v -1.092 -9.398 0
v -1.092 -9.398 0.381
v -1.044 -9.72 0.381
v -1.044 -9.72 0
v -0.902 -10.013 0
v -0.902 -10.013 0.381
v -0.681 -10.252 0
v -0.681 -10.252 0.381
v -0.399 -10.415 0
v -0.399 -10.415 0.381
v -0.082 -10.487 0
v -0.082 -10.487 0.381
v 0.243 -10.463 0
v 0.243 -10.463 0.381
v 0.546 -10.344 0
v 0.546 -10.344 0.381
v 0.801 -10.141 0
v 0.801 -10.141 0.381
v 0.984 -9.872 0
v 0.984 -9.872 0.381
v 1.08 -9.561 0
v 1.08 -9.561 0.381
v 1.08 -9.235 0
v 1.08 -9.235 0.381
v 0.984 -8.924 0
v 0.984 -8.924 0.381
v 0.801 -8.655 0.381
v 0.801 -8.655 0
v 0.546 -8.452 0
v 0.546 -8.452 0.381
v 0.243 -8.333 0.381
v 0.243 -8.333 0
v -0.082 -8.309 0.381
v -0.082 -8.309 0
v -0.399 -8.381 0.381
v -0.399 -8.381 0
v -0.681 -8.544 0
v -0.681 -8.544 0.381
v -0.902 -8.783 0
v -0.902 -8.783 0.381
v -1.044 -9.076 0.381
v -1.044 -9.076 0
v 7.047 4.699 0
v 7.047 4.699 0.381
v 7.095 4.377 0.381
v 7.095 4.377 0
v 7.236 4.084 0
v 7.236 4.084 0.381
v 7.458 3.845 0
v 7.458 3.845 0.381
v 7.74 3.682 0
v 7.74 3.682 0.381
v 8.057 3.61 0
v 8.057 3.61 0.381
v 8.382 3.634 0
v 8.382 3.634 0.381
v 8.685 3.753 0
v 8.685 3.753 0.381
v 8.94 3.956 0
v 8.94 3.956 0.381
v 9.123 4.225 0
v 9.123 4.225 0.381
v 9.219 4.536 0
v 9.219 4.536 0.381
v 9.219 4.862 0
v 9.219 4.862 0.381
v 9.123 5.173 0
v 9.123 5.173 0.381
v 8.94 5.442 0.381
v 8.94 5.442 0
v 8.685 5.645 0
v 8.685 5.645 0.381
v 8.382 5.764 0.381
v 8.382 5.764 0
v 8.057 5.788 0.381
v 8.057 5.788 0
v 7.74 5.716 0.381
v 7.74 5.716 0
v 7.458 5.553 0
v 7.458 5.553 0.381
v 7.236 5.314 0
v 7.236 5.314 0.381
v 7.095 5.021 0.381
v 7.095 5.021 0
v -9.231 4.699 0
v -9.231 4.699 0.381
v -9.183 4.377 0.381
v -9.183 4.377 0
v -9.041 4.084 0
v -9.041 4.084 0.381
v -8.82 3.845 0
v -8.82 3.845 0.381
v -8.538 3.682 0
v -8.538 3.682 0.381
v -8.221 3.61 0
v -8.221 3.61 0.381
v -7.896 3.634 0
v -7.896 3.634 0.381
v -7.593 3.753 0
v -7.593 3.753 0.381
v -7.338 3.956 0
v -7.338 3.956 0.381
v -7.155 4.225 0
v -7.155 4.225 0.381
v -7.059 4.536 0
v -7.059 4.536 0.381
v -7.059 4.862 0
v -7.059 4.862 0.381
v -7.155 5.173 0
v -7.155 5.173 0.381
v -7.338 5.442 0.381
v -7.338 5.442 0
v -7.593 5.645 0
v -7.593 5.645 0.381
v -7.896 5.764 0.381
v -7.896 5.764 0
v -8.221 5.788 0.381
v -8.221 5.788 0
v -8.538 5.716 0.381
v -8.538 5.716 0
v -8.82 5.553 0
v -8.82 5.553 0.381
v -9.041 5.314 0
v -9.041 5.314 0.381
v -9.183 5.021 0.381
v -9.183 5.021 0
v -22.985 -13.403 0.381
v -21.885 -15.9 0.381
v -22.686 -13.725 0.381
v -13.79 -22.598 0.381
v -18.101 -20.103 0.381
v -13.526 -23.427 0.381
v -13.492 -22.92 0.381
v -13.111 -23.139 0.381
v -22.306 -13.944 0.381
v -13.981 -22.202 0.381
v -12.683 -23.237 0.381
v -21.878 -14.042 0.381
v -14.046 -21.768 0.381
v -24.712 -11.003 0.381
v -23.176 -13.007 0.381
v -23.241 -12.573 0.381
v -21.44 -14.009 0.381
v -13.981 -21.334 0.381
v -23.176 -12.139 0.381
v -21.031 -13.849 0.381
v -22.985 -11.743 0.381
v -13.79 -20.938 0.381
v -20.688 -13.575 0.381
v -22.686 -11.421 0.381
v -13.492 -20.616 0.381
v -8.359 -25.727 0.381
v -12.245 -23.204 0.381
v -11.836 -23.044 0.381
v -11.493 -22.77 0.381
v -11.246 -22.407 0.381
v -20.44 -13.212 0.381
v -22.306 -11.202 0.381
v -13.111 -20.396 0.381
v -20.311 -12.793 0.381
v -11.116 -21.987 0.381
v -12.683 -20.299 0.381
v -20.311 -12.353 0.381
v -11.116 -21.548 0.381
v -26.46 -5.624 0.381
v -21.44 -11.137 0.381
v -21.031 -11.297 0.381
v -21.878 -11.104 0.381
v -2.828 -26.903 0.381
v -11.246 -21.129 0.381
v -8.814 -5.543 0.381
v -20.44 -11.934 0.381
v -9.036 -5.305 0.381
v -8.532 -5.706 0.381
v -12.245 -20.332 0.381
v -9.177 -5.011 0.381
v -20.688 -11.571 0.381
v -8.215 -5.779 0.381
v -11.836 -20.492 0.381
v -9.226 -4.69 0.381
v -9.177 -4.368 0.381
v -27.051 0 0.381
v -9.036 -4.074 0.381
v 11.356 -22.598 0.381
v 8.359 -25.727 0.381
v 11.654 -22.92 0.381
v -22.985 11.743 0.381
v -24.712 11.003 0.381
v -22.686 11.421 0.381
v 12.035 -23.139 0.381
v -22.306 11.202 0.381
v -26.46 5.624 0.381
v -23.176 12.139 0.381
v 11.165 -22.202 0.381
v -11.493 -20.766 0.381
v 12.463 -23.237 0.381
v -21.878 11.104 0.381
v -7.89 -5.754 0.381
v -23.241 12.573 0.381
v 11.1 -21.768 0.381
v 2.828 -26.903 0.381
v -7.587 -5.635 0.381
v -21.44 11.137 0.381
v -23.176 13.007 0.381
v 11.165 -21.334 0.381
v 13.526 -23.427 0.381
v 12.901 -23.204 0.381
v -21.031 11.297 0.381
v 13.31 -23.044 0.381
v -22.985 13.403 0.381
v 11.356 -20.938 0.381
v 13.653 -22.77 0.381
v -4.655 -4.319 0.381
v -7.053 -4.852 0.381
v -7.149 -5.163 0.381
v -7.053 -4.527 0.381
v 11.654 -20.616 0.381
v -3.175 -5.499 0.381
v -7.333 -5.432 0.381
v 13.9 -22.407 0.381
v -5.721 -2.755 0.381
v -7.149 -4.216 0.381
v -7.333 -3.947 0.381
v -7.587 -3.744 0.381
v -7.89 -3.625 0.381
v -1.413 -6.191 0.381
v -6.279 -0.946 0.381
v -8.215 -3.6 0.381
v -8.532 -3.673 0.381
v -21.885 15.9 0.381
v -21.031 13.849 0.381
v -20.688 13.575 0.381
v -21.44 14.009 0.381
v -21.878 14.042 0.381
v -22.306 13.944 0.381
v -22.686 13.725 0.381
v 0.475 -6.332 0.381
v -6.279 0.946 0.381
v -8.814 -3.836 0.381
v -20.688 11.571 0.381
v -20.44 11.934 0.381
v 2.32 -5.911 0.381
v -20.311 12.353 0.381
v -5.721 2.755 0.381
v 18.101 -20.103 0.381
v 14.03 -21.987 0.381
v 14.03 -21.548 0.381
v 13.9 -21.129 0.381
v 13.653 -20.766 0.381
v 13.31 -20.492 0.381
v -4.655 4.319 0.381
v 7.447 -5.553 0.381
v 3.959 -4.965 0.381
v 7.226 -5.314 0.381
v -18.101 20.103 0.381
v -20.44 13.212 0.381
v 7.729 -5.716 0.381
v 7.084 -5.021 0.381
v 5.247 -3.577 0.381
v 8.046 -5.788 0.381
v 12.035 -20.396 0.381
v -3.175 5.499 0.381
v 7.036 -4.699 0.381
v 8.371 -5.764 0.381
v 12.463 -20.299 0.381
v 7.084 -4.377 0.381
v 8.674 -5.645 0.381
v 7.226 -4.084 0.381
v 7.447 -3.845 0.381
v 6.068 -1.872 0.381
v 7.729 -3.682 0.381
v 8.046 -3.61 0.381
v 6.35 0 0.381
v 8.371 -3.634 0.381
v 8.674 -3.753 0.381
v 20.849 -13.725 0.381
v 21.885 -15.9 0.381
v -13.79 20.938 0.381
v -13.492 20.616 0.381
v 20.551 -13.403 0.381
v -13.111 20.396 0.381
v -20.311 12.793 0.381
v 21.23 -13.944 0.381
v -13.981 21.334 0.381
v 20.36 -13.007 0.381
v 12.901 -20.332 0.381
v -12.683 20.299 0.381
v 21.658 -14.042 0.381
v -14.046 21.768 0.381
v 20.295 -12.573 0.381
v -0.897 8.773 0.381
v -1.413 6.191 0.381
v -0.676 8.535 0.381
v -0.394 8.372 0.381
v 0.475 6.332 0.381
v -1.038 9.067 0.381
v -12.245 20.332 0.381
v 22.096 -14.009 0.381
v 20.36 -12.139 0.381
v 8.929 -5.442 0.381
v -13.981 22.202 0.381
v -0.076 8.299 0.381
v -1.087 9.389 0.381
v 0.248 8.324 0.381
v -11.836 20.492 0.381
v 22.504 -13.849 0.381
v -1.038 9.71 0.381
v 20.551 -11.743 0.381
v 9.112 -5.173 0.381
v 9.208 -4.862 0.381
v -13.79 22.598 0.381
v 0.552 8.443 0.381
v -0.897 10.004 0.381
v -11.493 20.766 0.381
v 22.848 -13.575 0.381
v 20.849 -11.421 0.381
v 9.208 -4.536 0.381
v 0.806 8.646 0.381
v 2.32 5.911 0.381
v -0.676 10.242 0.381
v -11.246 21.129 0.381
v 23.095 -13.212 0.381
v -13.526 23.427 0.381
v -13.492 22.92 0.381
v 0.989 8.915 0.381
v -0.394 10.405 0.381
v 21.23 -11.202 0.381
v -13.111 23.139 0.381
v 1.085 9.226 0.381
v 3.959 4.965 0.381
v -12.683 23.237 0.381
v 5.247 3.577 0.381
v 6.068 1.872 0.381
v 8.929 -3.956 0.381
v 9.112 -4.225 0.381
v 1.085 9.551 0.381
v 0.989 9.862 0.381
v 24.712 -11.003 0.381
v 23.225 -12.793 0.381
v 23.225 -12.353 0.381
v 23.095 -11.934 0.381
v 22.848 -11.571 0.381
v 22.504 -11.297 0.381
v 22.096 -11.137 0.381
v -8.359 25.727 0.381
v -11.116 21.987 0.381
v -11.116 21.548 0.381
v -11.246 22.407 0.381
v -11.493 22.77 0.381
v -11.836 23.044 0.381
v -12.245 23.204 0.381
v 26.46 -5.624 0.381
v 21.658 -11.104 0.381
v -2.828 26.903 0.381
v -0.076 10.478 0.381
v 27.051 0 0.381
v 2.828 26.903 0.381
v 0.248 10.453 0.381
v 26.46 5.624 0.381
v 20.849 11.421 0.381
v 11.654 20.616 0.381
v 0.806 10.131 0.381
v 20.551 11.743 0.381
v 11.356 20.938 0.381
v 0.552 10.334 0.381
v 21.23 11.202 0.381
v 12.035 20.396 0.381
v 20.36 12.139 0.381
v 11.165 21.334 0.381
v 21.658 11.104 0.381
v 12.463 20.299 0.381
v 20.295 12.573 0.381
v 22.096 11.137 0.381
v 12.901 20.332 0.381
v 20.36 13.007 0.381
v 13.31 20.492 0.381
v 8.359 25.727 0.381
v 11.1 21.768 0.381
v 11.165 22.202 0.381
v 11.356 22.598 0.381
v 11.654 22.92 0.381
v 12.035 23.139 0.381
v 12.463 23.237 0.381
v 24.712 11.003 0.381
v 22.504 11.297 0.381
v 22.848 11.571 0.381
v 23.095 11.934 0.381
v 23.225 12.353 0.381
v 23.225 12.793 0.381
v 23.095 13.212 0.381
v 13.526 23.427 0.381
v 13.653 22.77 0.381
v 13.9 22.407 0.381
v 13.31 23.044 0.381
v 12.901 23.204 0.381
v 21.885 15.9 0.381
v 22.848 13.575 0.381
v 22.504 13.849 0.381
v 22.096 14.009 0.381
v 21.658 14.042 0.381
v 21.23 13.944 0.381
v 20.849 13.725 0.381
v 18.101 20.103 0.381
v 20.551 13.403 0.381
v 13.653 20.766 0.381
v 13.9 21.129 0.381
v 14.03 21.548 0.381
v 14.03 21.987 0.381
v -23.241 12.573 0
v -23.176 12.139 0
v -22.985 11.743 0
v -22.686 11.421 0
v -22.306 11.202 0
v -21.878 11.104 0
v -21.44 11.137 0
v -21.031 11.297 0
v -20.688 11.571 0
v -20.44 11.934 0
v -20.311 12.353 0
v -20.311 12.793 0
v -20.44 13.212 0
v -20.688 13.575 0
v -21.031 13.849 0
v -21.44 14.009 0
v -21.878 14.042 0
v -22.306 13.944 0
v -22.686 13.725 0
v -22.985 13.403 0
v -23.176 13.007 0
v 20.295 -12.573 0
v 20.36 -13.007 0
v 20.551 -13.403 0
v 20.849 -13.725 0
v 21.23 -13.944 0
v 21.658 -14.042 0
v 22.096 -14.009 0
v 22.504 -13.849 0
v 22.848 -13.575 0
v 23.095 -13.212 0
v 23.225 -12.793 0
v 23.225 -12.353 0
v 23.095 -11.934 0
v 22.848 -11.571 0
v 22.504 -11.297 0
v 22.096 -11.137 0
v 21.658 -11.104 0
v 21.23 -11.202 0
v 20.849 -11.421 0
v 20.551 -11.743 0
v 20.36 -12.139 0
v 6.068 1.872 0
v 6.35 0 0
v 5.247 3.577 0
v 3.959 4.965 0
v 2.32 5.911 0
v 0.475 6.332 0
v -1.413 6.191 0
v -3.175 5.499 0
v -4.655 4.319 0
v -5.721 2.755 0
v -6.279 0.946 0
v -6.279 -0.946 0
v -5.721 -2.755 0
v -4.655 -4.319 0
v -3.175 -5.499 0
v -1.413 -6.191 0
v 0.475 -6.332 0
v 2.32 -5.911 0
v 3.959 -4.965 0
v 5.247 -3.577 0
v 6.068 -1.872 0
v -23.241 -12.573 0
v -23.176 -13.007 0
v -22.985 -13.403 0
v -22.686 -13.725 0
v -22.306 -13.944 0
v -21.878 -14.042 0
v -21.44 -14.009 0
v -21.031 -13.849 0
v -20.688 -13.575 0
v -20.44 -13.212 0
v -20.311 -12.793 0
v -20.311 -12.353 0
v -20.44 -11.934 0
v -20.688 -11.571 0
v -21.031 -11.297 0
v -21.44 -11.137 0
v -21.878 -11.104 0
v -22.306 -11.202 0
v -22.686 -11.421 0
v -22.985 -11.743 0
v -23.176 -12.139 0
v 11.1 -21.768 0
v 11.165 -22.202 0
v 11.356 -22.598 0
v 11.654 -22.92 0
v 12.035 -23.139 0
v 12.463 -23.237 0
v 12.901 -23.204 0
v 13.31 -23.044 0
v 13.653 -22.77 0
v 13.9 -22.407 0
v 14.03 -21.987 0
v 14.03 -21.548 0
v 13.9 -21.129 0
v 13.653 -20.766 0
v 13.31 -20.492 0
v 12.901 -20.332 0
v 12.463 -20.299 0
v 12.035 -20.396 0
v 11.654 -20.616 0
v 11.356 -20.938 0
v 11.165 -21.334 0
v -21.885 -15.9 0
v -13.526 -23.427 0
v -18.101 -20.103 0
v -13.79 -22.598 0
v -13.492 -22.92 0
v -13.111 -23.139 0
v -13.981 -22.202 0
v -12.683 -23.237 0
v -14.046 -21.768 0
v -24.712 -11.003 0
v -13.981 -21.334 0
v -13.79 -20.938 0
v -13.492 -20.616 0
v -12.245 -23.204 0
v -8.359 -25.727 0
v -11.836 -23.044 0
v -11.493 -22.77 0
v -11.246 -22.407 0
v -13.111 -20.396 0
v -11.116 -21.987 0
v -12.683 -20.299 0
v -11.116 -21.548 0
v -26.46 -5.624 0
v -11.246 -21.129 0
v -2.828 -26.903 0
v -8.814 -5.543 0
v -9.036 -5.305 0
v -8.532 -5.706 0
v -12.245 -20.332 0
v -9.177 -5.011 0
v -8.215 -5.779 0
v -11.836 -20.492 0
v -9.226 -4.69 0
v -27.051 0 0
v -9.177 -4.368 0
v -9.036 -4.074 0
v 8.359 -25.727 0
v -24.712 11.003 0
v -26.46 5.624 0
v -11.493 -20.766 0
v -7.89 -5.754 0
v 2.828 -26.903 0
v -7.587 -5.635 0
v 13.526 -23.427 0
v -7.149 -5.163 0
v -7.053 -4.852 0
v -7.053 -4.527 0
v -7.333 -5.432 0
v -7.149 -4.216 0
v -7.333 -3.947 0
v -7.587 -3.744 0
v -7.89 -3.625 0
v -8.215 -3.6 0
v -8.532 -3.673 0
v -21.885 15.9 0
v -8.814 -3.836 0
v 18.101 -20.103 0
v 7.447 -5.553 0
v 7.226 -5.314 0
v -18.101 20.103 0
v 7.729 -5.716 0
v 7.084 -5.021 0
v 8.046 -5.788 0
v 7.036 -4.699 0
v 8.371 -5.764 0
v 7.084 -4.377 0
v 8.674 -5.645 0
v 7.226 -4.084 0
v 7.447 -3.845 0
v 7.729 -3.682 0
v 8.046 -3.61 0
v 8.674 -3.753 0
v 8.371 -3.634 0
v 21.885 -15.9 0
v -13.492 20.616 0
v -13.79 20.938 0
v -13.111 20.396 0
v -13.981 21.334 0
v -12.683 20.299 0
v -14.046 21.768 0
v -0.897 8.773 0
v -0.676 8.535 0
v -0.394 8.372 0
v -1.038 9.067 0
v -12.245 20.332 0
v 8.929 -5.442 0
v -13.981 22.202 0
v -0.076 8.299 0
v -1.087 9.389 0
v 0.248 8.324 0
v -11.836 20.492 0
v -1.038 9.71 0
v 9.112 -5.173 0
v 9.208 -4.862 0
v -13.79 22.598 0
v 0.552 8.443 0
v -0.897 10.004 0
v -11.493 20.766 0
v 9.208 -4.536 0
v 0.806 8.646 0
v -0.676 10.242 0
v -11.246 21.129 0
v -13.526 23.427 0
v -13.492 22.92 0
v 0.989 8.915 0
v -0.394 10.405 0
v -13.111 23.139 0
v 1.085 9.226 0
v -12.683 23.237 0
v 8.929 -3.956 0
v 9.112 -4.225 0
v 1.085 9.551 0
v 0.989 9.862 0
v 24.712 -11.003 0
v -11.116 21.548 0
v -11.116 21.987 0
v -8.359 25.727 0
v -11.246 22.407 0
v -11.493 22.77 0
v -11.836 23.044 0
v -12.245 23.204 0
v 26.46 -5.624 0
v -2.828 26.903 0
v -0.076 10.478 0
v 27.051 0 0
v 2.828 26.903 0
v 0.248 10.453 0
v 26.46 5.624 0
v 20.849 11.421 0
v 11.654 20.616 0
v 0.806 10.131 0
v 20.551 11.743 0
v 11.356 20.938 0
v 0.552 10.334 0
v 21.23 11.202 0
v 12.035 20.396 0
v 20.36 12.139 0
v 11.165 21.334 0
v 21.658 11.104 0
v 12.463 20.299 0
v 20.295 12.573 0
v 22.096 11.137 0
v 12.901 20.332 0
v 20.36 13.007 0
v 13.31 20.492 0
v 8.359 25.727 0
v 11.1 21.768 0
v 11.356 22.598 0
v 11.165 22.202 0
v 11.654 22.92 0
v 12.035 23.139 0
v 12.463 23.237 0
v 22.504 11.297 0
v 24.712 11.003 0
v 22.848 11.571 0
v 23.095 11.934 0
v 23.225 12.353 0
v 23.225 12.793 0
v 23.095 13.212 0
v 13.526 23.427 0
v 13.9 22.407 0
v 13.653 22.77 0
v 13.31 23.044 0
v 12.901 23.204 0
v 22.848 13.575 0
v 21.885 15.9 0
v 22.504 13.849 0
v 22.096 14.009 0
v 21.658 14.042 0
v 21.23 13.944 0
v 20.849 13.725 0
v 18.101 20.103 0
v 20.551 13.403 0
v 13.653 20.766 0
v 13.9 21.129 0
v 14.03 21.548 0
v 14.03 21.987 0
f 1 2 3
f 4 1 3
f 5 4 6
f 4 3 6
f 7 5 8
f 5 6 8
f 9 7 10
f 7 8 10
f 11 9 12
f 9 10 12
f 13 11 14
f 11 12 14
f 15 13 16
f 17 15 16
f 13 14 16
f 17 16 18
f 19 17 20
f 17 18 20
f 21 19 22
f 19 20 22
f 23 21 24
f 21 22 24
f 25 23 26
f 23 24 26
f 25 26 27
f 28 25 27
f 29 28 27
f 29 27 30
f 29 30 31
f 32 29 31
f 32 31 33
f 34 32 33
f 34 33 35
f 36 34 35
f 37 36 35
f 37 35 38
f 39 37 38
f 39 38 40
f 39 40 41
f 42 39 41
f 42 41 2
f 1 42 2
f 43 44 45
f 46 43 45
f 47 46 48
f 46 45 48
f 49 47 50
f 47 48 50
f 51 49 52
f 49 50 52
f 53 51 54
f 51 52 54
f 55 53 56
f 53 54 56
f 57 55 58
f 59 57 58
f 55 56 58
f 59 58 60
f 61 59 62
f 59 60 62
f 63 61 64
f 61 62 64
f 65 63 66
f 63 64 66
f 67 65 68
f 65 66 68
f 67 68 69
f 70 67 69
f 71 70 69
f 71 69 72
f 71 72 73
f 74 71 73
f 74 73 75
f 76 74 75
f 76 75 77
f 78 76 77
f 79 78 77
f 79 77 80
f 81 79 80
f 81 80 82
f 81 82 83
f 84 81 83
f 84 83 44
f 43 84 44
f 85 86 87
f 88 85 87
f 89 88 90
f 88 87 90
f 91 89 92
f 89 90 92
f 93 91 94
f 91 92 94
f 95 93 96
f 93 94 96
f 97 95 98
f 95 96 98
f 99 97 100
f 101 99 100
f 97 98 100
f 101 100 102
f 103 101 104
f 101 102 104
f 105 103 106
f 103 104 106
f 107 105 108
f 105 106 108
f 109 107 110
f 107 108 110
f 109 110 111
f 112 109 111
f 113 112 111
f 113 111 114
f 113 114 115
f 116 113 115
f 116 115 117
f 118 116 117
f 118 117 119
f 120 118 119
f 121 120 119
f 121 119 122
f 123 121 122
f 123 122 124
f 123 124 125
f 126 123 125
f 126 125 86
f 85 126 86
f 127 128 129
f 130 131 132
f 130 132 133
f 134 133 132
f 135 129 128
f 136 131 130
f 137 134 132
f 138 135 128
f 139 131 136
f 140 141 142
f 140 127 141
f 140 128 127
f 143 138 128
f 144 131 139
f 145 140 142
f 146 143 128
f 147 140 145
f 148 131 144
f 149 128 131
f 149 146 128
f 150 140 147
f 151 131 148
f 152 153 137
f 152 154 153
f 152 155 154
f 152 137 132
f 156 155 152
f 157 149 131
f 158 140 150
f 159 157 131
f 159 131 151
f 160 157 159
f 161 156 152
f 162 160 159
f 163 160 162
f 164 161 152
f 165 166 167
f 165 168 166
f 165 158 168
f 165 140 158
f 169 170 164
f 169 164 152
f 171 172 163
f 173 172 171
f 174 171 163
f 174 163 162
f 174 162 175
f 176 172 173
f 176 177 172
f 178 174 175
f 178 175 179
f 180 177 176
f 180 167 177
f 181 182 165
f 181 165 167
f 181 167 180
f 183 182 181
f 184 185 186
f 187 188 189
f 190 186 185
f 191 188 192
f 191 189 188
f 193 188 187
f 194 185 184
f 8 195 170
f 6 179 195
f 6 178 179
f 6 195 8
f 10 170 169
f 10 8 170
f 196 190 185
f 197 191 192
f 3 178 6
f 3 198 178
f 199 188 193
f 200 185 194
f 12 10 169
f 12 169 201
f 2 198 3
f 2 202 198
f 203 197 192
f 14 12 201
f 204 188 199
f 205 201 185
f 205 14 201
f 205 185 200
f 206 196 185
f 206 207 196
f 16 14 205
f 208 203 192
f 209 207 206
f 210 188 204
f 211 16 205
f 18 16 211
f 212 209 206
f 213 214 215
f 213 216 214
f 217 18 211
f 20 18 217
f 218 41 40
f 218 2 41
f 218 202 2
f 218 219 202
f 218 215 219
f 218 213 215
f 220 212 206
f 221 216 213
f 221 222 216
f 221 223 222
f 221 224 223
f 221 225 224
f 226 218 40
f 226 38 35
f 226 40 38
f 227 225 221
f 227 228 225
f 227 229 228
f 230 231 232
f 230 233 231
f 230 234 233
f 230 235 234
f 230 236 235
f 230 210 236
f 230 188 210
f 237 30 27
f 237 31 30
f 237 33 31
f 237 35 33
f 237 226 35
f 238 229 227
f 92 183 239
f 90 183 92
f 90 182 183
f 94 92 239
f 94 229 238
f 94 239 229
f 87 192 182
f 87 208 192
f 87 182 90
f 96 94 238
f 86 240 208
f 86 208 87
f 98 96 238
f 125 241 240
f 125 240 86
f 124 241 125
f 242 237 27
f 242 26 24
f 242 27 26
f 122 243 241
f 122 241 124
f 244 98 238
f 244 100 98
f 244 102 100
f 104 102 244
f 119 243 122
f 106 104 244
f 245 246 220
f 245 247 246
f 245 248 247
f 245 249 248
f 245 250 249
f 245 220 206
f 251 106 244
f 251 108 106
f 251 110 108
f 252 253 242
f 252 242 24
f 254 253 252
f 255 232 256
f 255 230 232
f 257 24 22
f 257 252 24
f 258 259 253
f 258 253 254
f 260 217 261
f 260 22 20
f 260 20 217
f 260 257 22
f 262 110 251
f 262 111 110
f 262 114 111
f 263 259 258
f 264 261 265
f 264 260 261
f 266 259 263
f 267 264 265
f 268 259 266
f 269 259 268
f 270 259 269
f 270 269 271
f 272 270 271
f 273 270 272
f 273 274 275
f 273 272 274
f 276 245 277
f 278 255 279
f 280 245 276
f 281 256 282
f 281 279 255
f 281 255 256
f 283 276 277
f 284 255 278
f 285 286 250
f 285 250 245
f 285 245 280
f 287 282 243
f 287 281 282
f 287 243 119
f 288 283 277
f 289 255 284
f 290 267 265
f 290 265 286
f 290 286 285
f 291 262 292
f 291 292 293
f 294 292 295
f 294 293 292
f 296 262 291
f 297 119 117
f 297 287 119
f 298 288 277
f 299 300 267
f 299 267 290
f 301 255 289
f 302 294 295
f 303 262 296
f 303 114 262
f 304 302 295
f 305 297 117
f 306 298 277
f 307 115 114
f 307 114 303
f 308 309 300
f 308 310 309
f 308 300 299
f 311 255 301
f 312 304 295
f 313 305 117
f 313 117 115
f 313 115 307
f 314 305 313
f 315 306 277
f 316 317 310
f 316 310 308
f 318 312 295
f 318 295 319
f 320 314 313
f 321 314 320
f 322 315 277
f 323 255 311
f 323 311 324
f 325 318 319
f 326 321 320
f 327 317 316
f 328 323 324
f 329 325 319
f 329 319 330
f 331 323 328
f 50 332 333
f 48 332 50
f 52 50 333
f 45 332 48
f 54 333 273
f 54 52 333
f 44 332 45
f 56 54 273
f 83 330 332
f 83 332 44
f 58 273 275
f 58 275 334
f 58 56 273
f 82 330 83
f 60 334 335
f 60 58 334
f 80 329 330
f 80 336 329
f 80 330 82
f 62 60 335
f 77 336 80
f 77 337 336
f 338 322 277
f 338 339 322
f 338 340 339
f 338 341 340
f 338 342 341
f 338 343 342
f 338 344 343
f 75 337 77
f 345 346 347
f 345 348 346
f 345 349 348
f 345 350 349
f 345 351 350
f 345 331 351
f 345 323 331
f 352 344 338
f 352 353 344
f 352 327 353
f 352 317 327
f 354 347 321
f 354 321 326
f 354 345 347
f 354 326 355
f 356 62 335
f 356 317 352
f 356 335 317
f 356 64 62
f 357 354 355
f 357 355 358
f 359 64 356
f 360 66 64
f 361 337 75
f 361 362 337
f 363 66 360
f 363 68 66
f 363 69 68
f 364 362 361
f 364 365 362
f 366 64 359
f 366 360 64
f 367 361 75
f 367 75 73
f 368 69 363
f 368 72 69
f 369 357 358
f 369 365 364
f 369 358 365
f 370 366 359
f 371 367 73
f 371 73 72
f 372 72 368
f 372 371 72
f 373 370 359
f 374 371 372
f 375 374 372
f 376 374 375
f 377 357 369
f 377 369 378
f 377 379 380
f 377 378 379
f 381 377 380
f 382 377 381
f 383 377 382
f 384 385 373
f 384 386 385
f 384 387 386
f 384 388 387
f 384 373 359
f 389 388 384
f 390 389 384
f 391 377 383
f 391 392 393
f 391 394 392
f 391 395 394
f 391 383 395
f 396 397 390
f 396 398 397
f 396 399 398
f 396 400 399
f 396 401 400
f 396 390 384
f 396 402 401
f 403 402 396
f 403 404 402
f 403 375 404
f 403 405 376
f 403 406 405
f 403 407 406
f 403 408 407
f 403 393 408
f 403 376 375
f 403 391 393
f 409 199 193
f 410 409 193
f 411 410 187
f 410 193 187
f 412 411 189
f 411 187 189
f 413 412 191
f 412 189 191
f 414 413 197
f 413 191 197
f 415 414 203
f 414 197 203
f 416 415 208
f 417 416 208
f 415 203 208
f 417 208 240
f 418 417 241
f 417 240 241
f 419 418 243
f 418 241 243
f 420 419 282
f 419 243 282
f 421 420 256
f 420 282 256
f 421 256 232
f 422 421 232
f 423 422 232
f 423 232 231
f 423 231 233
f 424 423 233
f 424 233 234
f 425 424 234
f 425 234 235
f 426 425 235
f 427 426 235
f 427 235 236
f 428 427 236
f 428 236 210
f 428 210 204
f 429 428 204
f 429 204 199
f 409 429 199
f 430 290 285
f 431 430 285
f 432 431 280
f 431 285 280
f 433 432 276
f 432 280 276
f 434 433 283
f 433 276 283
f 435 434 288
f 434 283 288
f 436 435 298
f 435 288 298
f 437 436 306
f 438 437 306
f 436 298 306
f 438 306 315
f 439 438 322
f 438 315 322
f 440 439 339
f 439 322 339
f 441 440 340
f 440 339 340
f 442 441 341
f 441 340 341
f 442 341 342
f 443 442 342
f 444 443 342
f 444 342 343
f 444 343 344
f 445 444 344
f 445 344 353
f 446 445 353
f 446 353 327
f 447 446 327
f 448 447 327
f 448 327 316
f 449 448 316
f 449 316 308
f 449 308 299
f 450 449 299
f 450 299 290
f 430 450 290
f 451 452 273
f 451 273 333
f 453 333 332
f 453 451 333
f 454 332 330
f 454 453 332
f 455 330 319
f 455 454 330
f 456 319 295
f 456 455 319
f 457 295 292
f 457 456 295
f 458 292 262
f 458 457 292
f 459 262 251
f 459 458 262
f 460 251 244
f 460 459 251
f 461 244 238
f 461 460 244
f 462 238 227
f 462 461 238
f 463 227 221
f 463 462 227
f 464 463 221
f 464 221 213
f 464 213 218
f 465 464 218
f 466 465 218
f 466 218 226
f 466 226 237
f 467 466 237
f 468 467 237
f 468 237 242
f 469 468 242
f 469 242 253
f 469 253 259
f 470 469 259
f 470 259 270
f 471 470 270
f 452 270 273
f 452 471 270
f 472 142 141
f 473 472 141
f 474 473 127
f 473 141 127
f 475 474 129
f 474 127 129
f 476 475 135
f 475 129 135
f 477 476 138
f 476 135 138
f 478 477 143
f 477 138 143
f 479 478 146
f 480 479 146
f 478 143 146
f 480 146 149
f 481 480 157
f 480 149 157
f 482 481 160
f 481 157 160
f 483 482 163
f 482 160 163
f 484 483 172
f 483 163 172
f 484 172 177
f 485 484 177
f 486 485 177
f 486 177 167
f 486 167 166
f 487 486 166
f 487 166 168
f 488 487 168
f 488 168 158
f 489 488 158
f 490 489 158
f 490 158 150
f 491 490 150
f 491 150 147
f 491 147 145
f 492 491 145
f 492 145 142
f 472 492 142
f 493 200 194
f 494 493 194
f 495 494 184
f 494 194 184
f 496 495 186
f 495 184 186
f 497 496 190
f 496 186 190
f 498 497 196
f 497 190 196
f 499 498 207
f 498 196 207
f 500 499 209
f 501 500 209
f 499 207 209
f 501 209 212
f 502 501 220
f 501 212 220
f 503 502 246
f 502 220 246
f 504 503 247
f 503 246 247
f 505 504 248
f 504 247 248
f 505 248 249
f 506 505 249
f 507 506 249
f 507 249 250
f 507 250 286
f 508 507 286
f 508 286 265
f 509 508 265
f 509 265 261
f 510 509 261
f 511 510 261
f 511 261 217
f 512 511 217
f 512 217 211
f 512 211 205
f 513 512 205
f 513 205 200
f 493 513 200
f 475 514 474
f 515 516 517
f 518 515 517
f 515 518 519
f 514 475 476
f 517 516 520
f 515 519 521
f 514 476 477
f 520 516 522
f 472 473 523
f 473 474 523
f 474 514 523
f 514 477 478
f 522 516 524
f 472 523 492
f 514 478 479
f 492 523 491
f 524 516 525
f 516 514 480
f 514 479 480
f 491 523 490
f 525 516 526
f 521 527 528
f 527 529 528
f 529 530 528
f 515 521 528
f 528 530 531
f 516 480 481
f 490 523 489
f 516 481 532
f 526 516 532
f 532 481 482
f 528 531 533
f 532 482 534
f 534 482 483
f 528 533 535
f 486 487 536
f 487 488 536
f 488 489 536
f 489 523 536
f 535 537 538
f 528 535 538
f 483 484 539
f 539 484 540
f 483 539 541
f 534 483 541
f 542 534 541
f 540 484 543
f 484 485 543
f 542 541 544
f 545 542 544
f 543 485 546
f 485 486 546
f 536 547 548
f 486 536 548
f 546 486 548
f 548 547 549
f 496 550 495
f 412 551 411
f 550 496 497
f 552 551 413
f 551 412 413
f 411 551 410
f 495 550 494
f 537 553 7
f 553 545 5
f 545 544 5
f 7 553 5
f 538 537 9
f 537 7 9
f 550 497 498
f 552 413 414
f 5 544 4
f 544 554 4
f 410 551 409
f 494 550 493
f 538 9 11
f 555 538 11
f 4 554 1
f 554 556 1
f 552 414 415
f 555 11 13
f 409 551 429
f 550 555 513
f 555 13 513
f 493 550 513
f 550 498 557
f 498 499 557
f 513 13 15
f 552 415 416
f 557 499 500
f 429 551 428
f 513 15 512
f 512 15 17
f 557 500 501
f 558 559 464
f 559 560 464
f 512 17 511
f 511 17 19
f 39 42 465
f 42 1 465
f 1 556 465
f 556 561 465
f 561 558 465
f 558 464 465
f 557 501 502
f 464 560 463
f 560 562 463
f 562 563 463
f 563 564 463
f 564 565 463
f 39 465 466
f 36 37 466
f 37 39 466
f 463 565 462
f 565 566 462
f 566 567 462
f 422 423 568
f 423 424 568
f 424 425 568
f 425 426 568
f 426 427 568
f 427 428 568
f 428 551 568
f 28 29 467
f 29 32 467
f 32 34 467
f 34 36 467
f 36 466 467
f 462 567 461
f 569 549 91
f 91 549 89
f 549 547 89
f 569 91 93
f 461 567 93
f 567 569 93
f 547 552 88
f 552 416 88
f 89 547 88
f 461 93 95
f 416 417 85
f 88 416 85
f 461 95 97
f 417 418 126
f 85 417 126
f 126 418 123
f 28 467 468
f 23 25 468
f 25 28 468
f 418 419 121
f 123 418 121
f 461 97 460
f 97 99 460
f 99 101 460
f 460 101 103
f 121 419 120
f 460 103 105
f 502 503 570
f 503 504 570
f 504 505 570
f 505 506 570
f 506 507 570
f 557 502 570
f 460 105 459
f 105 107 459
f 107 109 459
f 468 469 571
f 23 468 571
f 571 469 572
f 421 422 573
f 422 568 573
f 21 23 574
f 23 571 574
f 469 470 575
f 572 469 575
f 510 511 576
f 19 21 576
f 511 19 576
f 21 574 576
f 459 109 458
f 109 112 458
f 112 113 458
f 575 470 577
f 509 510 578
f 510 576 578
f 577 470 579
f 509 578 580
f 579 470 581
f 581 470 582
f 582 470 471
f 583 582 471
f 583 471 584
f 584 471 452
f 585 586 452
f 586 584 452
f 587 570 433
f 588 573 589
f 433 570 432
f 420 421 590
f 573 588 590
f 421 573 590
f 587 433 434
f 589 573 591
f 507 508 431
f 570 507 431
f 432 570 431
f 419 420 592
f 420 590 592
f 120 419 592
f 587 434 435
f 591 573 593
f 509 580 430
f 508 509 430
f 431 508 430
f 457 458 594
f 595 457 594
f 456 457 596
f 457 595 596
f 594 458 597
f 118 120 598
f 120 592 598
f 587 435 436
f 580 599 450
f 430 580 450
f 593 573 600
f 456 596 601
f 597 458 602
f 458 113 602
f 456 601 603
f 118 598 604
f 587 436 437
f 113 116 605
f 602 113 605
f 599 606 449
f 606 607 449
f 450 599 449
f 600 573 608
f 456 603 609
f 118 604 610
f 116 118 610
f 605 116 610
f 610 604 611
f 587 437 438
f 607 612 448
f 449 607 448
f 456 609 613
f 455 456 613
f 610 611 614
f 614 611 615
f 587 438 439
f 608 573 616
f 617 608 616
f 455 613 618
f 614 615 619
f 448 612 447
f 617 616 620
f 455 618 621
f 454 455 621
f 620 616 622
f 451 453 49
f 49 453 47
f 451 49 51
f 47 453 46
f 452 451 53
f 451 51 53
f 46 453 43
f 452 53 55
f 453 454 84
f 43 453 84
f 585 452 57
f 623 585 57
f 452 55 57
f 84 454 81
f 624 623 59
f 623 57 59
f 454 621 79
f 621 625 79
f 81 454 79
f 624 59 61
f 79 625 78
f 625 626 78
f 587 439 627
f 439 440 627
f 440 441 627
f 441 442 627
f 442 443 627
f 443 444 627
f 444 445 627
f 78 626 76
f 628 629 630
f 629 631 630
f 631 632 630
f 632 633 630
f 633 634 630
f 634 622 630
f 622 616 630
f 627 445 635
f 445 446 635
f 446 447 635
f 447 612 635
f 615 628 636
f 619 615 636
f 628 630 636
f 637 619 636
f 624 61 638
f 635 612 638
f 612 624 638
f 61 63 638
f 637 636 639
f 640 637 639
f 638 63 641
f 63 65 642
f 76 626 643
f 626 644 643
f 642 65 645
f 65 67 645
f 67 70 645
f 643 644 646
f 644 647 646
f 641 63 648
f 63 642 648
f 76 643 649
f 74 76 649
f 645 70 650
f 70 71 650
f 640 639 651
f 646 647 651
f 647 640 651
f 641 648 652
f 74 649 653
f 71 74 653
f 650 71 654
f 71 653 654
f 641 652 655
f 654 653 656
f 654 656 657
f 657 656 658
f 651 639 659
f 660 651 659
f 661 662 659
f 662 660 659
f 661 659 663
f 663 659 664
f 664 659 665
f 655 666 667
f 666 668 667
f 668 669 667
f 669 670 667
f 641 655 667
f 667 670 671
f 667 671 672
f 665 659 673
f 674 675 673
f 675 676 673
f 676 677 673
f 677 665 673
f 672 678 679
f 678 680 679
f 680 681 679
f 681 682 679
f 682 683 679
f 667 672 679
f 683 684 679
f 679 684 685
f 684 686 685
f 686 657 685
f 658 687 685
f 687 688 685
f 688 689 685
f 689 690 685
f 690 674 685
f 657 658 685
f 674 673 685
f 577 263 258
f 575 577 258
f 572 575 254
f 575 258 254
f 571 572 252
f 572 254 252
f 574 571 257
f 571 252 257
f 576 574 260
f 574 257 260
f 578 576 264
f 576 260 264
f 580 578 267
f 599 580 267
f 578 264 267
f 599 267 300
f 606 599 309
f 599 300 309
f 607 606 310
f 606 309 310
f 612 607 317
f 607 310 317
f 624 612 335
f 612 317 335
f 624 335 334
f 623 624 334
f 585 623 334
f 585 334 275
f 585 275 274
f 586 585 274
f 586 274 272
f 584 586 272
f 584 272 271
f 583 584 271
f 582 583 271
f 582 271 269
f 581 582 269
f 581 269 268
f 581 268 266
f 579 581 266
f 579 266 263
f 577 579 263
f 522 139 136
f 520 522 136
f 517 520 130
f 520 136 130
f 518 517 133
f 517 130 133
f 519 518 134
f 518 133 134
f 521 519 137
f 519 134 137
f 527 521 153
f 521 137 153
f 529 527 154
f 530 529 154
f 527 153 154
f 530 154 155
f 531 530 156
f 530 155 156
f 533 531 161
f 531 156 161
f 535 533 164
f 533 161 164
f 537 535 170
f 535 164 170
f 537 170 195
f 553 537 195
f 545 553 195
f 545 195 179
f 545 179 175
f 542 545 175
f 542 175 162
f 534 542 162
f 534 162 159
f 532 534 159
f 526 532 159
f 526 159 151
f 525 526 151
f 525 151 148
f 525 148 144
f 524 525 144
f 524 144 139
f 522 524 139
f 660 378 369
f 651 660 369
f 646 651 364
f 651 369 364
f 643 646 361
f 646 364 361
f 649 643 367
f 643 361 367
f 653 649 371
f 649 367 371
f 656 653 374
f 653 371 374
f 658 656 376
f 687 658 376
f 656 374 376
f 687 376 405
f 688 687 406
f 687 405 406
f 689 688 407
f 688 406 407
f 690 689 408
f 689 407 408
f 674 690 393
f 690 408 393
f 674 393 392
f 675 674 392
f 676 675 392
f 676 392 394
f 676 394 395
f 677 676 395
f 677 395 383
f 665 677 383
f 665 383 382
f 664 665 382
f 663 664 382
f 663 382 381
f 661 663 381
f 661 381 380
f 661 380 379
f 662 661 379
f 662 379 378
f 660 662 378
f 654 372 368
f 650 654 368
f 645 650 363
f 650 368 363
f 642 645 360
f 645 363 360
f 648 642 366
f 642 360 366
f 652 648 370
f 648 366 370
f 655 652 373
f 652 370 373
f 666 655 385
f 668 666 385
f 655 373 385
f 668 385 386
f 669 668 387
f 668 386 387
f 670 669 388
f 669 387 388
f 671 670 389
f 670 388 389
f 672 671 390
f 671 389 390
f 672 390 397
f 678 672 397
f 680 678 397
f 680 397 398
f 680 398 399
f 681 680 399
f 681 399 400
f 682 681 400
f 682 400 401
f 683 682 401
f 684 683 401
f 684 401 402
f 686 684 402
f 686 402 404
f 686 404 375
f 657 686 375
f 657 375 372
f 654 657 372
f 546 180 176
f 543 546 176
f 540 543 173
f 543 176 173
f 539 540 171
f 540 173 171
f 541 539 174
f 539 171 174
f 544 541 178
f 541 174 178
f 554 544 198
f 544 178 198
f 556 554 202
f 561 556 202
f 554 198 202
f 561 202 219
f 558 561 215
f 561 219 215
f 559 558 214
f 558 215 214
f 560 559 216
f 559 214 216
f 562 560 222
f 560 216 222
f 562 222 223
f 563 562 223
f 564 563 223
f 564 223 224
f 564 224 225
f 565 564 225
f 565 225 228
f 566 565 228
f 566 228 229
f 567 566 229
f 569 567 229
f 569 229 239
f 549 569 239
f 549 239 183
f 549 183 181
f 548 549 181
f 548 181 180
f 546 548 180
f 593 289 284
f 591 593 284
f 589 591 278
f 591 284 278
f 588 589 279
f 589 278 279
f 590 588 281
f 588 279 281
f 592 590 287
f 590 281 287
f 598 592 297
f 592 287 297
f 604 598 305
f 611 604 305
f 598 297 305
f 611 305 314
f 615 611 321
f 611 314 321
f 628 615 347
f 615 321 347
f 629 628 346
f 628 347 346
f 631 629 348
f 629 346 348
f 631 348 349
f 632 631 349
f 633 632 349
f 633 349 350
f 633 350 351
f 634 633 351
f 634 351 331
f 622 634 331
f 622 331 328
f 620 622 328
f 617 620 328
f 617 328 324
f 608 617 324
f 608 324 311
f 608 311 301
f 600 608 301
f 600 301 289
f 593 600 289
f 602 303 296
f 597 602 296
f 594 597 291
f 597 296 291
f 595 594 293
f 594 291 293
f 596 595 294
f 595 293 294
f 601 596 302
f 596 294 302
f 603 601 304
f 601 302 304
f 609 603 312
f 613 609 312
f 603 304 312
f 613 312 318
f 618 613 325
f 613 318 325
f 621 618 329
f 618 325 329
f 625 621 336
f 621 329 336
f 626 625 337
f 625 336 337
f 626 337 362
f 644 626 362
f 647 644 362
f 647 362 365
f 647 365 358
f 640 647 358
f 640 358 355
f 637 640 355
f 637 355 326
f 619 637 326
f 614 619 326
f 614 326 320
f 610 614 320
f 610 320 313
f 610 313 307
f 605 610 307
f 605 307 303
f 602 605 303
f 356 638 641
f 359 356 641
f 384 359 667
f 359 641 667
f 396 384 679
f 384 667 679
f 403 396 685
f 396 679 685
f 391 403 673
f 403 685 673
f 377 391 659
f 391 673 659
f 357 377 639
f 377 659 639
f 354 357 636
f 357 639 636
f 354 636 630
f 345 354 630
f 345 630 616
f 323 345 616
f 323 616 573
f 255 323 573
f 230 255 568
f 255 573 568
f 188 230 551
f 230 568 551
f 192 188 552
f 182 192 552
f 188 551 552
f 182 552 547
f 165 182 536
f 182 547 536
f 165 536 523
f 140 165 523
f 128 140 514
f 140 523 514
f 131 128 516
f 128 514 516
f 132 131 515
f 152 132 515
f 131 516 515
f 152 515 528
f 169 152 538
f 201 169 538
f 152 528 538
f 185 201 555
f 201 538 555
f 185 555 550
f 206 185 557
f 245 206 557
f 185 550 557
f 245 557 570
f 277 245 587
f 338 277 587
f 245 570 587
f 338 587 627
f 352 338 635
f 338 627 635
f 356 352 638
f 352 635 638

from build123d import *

# Parameters (mm, degrees)
F0_R     = 27.051
F0_R_2   = 6.35
F1_DEPTH = 0.381
F2_D     = 2.9464
F3_D     = 2.1844


with BuildPart() as f1:
    # F0 (on Top) → F1 (new body)
    with BuildSketch(Plane.XY):
        Circle(F0_R)
        Circle(F0_R_2, mode=Mode.SUBTRACT)
    extrude(amount=F1_DEPTH)

    # F2 (through all)
    with Locations(Plane(origin=(0, 0, 0), x_dir=(1, 0, 0), z_dir=(0, 0, -1))):
        with Locations((-21.7678, -12.573), (-12.573, -21.7678), (12.573, -21.7678), (21.7678, -12.573), (21.7678, 12.573), (12.573, 21.7678), (-12.573, 21.7678), (-21.7678, 12.573)):
            Hole(F2_D / 2)

    # F3 (through all)
    with Locations(Plane(origin=(0, 0, 0), x_dir=(1, 0, 0), z_dir=(0, 0, -1))):
        with Locations((0, 9.398), (8.128, 4.699), (-8.1389067448, -4.699), (0, 0), (0.0054533724, -9.388554482), (8.1389067448, -4.699), (-8.1334533724, 4.689554482)):
            Hole(F3_D / 2)


solid = f1.part
